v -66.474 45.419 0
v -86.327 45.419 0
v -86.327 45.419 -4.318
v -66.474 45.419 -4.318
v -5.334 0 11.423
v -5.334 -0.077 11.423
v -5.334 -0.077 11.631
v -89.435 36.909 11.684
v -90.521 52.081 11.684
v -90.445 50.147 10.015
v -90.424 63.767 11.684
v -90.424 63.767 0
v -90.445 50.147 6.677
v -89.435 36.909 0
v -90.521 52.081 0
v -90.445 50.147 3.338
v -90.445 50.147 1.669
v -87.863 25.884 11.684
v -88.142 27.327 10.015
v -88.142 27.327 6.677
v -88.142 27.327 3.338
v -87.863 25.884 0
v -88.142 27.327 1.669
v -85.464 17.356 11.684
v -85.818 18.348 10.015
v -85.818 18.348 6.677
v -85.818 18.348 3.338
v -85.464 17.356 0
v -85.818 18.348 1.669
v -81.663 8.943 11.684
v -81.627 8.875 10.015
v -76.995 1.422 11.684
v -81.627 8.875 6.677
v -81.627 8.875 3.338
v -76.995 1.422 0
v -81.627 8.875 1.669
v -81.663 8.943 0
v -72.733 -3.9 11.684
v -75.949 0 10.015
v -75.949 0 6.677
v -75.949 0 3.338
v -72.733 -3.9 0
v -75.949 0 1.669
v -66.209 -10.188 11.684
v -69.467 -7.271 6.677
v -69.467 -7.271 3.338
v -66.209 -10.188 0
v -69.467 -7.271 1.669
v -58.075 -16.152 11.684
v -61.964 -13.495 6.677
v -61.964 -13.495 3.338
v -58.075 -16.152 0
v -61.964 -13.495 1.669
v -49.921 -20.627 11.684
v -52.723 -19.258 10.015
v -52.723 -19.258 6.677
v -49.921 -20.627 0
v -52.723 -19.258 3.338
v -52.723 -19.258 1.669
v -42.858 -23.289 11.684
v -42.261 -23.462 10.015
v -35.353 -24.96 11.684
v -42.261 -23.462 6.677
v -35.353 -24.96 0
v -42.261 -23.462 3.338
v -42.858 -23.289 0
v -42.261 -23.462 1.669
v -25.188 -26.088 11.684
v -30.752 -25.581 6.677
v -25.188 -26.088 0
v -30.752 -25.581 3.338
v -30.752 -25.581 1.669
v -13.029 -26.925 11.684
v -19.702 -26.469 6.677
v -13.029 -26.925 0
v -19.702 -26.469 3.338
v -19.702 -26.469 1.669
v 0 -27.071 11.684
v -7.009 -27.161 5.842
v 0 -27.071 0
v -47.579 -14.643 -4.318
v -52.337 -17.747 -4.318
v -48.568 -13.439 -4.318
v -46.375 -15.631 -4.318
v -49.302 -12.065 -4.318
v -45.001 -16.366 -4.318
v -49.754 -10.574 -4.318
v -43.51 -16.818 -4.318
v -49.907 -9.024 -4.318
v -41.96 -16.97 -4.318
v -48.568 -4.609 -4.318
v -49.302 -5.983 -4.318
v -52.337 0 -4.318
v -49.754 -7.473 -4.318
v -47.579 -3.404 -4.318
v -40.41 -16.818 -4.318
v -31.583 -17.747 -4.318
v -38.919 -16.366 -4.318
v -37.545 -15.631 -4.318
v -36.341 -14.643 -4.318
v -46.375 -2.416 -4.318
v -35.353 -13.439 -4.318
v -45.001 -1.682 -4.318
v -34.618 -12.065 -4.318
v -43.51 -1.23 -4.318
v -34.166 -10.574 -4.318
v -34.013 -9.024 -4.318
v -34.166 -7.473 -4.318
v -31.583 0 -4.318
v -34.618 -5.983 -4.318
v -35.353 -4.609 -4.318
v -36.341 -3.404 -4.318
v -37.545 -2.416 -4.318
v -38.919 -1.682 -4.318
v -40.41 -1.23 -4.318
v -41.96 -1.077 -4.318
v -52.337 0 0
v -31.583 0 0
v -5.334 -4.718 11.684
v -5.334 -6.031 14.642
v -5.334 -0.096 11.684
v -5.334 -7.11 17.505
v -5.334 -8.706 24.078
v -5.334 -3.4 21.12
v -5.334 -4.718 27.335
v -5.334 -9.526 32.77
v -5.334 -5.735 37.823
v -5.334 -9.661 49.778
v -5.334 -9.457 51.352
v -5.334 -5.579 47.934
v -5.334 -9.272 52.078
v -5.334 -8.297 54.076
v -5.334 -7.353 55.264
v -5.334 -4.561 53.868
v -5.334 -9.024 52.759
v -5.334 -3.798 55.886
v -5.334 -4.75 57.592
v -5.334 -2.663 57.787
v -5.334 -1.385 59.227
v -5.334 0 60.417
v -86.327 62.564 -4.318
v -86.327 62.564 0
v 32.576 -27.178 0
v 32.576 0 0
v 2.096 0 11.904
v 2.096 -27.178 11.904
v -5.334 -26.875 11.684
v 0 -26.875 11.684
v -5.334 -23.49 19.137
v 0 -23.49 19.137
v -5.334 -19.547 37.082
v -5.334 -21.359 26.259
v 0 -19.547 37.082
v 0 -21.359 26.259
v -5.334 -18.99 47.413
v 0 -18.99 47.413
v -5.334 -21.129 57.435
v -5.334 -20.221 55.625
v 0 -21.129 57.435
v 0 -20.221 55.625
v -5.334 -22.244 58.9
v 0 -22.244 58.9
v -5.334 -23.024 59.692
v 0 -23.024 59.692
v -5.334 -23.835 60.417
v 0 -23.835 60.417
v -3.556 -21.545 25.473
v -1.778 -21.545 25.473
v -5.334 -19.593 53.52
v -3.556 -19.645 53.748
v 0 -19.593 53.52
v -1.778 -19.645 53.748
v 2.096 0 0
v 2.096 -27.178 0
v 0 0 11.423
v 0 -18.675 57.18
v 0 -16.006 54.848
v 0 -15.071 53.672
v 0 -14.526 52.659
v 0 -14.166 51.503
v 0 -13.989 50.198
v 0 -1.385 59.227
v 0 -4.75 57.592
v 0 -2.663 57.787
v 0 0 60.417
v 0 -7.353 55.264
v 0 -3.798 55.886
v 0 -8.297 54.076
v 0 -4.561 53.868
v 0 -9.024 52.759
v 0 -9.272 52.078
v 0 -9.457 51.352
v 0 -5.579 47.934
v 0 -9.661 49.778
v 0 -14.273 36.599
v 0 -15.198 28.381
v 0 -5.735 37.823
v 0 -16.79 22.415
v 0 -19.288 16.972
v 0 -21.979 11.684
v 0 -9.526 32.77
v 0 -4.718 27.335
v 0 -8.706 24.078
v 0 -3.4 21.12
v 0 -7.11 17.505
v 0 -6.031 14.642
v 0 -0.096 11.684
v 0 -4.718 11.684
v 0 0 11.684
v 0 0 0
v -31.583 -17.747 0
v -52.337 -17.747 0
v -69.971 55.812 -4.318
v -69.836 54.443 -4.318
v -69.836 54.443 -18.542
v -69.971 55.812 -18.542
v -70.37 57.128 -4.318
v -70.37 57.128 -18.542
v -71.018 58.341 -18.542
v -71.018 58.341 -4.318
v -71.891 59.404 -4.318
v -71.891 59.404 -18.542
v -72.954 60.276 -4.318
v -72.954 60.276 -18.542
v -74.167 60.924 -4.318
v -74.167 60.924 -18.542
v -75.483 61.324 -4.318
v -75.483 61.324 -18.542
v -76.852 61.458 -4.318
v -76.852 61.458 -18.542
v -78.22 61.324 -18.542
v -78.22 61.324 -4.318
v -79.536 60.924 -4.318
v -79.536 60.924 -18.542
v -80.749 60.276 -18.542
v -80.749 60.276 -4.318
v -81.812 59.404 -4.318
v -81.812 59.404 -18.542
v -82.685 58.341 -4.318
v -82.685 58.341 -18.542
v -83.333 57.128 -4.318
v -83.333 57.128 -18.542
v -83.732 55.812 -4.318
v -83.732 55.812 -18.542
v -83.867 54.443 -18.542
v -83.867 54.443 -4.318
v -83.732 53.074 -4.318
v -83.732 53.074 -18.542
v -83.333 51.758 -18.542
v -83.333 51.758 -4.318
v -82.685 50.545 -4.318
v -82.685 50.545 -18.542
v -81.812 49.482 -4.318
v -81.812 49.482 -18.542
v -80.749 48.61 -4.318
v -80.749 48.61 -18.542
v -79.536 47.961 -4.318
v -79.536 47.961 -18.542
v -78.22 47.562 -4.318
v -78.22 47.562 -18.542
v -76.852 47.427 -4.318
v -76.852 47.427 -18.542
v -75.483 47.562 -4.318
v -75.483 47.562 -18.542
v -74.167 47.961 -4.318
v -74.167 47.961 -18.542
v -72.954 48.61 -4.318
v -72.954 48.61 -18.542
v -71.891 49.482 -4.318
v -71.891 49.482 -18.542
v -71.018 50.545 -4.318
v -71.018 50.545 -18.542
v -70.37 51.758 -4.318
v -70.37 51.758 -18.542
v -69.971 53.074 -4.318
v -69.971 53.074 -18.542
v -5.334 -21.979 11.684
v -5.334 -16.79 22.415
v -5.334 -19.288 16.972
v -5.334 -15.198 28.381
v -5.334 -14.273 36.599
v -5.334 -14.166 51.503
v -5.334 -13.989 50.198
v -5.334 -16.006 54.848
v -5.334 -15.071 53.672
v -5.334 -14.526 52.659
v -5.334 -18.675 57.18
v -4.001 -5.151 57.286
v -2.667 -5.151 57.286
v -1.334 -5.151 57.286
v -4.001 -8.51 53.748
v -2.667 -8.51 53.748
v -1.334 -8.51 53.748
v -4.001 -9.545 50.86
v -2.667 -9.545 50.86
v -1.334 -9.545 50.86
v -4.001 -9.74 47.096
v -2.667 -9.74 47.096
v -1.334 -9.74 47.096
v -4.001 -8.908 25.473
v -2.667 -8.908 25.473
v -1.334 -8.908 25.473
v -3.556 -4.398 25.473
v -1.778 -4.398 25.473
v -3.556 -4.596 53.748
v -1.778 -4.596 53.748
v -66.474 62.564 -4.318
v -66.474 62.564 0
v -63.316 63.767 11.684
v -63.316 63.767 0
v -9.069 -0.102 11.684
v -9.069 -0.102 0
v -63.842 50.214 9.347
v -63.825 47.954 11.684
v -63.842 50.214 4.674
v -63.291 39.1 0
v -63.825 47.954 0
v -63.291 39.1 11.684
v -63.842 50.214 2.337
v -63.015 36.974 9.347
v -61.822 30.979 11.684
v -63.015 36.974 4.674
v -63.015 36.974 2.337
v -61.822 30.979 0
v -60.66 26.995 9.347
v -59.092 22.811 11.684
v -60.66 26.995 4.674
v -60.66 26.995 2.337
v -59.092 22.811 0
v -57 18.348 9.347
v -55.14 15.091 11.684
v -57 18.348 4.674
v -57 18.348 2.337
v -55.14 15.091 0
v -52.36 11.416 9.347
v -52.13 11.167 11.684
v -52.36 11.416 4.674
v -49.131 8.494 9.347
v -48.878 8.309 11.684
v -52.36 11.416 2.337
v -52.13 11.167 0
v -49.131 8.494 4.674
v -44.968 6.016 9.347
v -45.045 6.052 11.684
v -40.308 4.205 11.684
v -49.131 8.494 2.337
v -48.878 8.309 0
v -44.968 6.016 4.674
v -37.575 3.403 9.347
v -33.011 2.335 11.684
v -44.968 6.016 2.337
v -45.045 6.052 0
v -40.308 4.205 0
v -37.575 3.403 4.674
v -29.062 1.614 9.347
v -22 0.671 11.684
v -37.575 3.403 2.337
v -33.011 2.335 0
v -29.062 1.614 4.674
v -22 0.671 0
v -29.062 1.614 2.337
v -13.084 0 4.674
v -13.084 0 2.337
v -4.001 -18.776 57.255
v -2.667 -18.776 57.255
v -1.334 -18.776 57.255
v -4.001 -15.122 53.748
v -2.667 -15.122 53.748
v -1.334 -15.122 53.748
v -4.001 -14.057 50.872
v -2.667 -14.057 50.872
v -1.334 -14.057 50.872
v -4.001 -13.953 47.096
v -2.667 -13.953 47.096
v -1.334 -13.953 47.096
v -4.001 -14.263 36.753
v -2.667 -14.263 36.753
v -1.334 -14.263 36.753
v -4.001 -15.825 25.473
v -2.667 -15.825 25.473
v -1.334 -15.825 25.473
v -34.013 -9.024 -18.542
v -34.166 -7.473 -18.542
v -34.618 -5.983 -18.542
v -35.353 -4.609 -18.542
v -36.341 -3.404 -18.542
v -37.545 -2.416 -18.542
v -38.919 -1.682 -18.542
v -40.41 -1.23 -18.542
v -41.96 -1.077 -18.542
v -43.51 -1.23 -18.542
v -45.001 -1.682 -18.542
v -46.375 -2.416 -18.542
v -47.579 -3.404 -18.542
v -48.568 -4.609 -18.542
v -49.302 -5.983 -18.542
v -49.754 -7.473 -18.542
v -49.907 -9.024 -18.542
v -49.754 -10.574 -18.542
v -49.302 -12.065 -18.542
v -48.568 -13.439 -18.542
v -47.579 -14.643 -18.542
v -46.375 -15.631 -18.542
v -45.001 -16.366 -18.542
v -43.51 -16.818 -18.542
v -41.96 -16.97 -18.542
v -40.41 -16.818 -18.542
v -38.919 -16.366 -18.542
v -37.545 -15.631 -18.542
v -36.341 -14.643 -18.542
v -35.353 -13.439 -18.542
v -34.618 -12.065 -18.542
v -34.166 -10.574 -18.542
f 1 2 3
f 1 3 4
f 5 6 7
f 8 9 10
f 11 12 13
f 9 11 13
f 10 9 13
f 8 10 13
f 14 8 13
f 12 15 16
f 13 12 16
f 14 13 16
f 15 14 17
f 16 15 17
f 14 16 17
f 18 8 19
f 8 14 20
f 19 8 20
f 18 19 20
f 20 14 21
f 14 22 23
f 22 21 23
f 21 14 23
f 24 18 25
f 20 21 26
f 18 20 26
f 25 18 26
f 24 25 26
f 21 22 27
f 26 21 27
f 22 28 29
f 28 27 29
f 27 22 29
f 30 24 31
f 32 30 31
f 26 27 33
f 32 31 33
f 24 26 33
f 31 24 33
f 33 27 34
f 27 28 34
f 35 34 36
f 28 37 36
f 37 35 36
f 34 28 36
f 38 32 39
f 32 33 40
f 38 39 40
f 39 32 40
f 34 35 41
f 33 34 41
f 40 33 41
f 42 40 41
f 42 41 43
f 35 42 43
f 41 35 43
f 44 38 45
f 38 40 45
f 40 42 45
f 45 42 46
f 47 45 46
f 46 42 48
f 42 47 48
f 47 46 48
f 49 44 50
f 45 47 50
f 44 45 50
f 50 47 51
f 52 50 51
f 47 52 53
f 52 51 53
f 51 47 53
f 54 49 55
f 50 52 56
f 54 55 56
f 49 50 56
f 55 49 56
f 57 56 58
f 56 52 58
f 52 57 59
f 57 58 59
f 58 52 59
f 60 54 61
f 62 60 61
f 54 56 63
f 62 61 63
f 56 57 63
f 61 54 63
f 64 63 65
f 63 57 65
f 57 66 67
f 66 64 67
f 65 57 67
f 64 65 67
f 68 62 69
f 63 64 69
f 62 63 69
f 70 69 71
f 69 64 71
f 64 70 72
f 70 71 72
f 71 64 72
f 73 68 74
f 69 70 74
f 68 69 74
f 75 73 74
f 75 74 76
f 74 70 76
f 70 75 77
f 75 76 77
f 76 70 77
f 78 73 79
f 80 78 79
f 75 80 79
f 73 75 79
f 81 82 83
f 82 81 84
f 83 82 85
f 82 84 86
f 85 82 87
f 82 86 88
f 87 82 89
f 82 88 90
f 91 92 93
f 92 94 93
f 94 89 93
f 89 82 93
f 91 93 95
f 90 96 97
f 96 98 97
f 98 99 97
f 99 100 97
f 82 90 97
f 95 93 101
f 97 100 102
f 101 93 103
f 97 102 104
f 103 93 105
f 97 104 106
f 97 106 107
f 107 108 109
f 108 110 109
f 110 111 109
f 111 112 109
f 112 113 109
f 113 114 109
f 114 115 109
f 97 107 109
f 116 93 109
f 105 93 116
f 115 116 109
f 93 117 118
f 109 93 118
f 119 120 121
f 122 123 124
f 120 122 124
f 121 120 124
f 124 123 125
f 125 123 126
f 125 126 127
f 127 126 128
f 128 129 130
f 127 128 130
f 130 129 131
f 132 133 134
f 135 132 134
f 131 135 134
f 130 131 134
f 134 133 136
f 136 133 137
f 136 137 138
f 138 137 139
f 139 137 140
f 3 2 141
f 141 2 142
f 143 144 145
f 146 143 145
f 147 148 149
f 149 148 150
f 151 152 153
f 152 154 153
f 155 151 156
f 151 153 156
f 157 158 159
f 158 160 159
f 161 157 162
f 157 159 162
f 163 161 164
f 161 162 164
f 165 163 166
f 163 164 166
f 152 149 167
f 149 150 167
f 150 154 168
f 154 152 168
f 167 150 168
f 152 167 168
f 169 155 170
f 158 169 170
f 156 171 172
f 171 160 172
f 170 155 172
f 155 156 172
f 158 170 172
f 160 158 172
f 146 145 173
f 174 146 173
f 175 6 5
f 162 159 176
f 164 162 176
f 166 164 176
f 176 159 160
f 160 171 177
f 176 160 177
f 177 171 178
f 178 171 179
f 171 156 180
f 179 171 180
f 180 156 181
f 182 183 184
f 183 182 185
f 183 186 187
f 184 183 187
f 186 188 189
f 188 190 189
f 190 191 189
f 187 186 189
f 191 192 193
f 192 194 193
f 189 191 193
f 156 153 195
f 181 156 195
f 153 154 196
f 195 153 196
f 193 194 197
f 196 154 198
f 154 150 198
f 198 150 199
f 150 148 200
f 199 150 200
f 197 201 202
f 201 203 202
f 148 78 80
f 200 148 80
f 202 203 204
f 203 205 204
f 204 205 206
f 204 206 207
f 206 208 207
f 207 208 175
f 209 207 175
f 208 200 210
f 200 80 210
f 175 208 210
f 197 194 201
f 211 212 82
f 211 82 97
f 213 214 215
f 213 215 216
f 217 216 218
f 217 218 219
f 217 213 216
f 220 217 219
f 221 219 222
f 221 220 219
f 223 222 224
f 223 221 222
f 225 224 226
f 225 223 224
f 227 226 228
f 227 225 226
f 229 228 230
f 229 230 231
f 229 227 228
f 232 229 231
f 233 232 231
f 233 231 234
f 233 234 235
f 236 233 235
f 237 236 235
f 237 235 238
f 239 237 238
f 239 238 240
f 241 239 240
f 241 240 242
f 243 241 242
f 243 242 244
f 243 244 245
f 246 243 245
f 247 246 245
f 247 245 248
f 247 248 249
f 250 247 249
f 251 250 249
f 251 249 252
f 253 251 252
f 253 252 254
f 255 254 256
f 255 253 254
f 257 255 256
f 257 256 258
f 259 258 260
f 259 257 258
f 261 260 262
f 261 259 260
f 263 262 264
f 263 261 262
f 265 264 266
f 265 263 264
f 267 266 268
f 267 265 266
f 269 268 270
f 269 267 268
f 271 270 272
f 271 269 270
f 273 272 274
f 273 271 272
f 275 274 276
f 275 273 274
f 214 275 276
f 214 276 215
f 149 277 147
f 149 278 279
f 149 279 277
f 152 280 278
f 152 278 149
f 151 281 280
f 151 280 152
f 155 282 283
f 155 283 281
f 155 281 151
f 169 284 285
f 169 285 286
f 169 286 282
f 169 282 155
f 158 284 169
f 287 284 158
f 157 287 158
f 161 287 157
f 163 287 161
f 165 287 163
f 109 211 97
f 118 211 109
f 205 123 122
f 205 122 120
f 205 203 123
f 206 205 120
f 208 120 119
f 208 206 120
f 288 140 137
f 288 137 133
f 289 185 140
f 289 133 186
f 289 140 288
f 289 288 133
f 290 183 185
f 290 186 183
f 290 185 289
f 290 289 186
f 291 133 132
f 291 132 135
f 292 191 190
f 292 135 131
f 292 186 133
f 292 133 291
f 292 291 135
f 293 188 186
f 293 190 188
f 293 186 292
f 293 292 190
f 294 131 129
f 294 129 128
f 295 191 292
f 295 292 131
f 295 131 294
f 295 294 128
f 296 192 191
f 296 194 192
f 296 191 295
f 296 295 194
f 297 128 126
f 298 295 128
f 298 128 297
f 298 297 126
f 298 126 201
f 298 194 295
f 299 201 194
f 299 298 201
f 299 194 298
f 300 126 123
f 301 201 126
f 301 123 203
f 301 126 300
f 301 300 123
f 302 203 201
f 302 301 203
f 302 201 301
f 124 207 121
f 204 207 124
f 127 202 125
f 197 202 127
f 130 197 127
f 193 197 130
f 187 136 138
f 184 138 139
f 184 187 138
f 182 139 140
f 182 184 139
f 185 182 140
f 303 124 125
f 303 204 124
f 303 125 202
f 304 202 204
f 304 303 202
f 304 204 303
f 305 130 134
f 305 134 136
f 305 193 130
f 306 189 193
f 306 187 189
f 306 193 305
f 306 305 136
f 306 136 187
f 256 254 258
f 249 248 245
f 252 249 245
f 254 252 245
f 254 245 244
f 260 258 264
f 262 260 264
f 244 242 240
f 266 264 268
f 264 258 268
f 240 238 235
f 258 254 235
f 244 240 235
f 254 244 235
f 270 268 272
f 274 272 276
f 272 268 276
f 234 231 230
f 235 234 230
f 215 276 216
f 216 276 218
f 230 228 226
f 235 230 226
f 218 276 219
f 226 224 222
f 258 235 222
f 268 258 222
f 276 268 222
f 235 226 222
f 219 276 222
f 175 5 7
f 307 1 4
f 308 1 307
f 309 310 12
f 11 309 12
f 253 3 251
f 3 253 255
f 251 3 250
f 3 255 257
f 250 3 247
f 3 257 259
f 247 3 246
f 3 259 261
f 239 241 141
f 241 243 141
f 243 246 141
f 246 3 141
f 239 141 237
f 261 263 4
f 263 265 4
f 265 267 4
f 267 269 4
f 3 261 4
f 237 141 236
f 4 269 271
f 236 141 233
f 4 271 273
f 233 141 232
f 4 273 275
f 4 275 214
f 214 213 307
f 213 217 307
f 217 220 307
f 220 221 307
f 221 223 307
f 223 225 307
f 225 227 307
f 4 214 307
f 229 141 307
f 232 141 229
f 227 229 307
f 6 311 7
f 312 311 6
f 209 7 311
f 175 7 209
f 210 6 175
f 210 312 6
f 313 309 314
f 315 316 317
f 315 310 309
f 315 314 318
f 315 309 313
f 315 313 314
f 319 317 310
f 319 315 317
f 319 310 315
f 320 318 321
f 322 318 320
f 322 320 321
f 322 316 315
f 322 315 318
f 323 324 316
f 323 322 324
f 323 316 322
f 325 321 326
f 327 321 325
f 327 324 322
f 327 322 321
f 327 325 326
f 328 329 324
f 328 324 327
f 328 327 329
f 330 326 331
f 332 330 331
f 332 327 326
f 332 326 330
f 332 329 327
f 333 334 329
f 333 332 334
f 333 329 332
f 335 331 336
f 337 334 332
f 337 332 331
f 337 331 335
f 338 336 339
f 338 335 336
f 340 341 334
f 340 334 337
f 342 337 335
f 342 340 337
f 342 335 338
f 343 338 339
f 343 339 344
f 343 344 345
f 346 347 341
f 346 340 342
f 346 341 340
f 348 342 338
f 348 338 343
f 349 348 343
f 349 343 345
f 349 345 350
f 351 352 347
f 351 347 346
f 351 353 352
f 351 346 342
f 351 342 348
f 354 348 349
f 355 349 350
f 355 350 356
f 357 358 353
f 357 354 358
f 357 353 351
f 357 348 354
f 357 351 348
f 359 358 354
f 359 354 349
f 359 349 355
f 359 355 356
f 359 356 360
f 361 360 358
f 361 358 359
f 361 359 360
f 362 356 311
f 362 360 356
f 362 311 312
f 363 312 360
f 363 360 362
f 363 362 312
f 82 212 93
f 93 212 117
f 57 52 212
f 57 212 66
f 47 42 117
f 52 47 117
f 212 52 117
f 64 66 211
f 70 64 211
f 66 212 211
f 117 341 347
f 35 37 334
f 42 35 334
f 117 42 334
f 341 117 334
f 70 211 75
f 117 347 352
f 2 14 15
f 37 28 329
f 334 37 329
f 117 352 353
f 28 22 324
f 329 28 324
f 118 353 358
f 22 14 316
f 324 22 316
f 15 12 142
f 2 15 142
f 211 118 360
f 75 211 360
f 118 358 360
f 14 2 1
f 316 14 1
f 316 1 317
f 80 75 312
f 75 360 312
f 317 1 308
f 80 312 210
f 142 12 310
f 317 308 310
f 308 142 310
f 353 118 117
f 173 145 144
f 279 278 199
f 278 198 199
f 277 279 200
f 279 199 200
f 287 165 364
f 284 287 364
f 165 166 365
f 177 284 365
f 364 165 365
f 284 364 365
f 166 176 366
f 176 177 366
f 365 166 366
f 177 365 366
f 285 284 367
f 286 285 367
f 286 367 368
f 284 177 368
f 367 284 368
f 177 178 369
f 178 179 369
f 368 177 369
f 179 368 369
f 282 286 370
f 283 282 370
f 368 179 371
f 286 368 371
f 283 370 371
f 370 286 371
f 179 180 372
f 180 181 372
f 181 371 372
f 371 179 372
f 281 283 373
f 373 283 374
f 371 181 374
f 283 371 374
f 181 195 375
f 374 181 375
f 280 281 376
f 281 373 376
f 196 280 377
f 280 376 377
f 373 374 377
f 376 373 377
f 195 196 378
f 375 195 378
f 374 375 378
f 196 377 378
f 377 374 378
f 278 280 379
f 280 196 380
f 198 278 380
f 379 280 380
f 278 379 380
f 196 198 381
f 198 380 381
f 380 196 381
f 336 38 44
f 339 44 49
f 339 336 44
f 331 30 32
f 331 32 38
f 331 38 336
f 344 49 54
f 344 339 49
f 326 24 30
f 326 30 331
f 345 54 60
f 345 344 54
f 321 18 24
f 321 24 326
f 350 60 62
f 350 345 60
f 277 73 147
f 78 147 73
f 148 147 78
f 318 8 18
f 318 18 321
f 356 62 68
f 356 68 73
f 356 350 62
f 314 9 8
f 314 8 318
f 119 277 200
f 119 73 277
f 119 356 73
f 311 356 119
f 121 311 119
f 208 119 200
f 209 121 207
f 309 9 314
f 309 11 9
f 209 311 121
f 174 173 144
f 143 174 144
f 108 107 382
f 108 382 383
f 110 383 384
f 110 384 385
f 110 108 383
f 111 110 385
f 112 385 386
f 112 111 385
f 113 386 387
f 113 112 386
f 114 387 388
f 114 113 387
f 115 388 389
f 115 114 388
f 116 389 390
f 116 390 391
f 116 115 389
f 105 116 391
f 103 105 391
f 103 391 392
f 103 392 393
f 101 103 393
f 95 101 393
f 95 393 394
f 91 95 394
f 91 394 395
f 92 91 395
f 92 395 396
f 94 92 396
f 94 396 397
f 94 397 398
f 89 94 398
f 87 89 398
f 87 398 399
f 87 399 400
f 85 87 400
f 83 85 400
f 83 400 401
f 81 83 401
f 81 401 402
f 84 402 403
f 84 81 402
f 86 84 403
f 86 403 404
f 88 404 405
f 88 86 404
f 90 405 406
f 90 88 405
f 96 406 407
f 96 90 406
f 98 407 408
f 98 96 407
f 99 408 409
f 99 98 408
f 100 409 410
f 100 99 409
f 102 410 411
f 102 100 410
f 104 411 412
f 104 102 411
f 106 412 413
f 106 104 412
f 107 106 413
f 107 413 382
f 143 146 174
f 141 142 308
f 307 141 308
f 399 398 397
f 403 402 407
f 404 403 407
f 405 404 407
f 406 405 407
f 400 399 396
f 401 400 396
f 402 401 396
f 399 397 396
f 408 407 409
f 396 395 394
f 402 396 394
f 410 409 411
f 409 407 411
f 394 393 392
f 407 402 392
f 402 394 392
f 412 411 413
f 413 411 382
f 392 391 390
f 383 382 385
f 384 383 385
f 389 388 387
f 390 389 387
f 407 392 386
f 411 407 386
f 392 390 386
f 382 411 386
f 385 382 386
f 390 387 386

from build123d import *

# Parameters (mm, degrees)
F0_W      = 19.8521018028
F0_H      = 17.1450003982
F1_DEPTH  = 4.318
F0_W_2    = 20.7544714212
F0_H_2    = 17.746578902
F2_R      = 7.0155570226
F3_DEPTH  = 18.542
F4_R      = 7.9467646893
F5_DEPTH  = 18.542
F7_DEPTH  = 11.684
F9_DEPTH  = 5.334
F11_DEPTH = 27.178


# Not quite as in the source:
# - a feature names something its author has since deleted; it is built from what else it names


with BuildPart() as f1:
    # F0 (on Top) → F1 (new body)
    with BuildSketch(Plane.XY):
        with Locations((-76.4005258679, 53.9917089045)):
            Rectangle(F0_W, F0_H)
    extrude(amount=-F1_DEPTH)

    # F2 (on Top) → F3 (join)
    with BuildSketch(Plane.XY):
        with Locations((-76.8517106771, 54.442897439)):
            Circle(F2_R)
    extrude(amount=-F3_DEPTH)



with BuildPart() as f1b:
    # F0 (on Top) → F1, piece 2 (new body)
    with BuildSketch(Plane.XY):
        with Locations((-41.960131377, -8.873289451)):
            Rectangle(F0_W_2, F0_H_2)
    extrude(amount=-F1_DEPTH)

    # F4 (on Top) → F5 (join)
    with BuildSketch(Plane.XY):
        with Locations((-41.960131377, -9.023684077)):
            Circle(F4_R)
    extrude(amount=-F5_DEPTH)


with BuildPart() as f1_1:
    add(f1.part)

    add(f1b.part)  # F7 merges F1b
    # F6 (on Top) → F7 (join)
    with BuildSketch(Plane.XY):
        with BuildLine():
            Line((-63.3161887527, 63.7673661113), (-90.4240001332, 63.7673661113))
            add(Edge.make_bspline(
                [(-90.4240001332, 63.7673661113), (-90.946889777, 54.9811213625), (-89.7279496558, 36.9041024903), (-87.016072715, 18.3355513143), (-76.691665346, -0.8600546564), (-62.441709707, -14.1630605577), (-42.9008739567, -25.1598232125), (-18.8968795163, -26.3894935088), (-8.1307288286, -27.3928058719), (0, -27.0710531622)],
                knots=[0, 0, 0, 0, 0.1597346938, 0.2941128272, 0.434918622, 0.5709144334, 0.7158725886, 0.8630406795, 1, 1, 1, 1], degree=3))
            Line((0, -27.0710531622), (0, 0))
            add(Edge.make_bspline(
                [(-63.3161887527, 63.7673661113), (-63.89678398, 55.0074521155), (-64.5294580411, 37.0316782662), (-57.7315789572, 17.9388743499), (-46.9451503691, 3.0561166092), (-12.5663186528, -0.6113698403), (-4.3614469469, 0), (0, 0)],
                knots=[0, 0, 0, 0, 0.224429372, 0.4162435973, 0.596206914, 0.8431707494, 1, 1, 1, 1], degree=3))
        make_face()
    extrude(amount=F7_DEPTH)

    # F8 (on Right) → F9 (join)
    with BuildSketch(Plane.YZ):
        with BuildLine():
            add(Edge.make_bspline(
                [(-27.004128322, 11.4234443754), (-24.9170712549, 15.6206381214), (-20.4925139948, 24.3371562752), (-17.3602385126, 54.0539118613), (-22.0986272096, 58.9304288492), (-23.8349272719, 60.4167338461)],
                knots=[0, 0, 0, 0, 0.323201421, 0.7663718509, 1, 1, 1, 1], degree=3))
            Line((-27.004128322, 11.4234443754), (-22.0986272096, 11.4234443754))
            add(Edge.make_bspline(
                [(-23.8349272719, 60.4167338461), (-20.3755259414, 58.5333244768), (-13.8305290902, 54.1752420005), (-13.9828351318, 46.9464555143), (-14.1446804387, 24.1753330063), (-19.9336931034, 16.1872758203), (-22.0986272096, 11.4234443754)],
                knots=[0, 0, 0, 0, 0.2285560301, 0.4078773473, 0.7293386816, 1, 1, 1, 1], degree=3))
        make_face()
        with BuildLine():
            Line((-4.5958016999, 11.4234443754), (0, 11.4234443754))
            add(Edge.make_bspline(
                [(0, 11.4234443754), (-1.5558292644, 15.6668477759), (-5.6052633039, 24.4549985378), (-6.7930231719, 54.1771953118), (-1.846077584, 58.9573064034), (0, 60.4167338461)],
                knots=[0, 0, 0, 0, 0.3197343851, 0.7628518919, 1, 1, 1, 1], degree=3))
            add(Edge.make_bspline(
                [(0, 60.4167338461), (-3.8426967978, 58.6067863753), (-9.5985845649, 54.1181159991), (-9.7955748005, 46.9674516518), (-9.7992443925, 24.4412973301), (-6.835249773, 16.1643384386), (-4.5958016999, 11.4234443754)],
                knots=[0, 0, 0, 0, 0.2287475428, 0.4096869795, 0.733305586, 1, 1, 1, 1], degree=3))
        make_face()
    extrude(amount=-F9_DEPTH)


with BuildPart() as f11:
    # F10 (on Front) → F11 (new body)
    with BuildSketch(Plane.XZ):
        Polygon((32.5760170817, 0), (2.0960178226, 11.903770268), (2.0960178226, 0), align=None)
    extrude(amount=F11_DEPTH)


solid = Compound([f1_1.part, f11.part])
